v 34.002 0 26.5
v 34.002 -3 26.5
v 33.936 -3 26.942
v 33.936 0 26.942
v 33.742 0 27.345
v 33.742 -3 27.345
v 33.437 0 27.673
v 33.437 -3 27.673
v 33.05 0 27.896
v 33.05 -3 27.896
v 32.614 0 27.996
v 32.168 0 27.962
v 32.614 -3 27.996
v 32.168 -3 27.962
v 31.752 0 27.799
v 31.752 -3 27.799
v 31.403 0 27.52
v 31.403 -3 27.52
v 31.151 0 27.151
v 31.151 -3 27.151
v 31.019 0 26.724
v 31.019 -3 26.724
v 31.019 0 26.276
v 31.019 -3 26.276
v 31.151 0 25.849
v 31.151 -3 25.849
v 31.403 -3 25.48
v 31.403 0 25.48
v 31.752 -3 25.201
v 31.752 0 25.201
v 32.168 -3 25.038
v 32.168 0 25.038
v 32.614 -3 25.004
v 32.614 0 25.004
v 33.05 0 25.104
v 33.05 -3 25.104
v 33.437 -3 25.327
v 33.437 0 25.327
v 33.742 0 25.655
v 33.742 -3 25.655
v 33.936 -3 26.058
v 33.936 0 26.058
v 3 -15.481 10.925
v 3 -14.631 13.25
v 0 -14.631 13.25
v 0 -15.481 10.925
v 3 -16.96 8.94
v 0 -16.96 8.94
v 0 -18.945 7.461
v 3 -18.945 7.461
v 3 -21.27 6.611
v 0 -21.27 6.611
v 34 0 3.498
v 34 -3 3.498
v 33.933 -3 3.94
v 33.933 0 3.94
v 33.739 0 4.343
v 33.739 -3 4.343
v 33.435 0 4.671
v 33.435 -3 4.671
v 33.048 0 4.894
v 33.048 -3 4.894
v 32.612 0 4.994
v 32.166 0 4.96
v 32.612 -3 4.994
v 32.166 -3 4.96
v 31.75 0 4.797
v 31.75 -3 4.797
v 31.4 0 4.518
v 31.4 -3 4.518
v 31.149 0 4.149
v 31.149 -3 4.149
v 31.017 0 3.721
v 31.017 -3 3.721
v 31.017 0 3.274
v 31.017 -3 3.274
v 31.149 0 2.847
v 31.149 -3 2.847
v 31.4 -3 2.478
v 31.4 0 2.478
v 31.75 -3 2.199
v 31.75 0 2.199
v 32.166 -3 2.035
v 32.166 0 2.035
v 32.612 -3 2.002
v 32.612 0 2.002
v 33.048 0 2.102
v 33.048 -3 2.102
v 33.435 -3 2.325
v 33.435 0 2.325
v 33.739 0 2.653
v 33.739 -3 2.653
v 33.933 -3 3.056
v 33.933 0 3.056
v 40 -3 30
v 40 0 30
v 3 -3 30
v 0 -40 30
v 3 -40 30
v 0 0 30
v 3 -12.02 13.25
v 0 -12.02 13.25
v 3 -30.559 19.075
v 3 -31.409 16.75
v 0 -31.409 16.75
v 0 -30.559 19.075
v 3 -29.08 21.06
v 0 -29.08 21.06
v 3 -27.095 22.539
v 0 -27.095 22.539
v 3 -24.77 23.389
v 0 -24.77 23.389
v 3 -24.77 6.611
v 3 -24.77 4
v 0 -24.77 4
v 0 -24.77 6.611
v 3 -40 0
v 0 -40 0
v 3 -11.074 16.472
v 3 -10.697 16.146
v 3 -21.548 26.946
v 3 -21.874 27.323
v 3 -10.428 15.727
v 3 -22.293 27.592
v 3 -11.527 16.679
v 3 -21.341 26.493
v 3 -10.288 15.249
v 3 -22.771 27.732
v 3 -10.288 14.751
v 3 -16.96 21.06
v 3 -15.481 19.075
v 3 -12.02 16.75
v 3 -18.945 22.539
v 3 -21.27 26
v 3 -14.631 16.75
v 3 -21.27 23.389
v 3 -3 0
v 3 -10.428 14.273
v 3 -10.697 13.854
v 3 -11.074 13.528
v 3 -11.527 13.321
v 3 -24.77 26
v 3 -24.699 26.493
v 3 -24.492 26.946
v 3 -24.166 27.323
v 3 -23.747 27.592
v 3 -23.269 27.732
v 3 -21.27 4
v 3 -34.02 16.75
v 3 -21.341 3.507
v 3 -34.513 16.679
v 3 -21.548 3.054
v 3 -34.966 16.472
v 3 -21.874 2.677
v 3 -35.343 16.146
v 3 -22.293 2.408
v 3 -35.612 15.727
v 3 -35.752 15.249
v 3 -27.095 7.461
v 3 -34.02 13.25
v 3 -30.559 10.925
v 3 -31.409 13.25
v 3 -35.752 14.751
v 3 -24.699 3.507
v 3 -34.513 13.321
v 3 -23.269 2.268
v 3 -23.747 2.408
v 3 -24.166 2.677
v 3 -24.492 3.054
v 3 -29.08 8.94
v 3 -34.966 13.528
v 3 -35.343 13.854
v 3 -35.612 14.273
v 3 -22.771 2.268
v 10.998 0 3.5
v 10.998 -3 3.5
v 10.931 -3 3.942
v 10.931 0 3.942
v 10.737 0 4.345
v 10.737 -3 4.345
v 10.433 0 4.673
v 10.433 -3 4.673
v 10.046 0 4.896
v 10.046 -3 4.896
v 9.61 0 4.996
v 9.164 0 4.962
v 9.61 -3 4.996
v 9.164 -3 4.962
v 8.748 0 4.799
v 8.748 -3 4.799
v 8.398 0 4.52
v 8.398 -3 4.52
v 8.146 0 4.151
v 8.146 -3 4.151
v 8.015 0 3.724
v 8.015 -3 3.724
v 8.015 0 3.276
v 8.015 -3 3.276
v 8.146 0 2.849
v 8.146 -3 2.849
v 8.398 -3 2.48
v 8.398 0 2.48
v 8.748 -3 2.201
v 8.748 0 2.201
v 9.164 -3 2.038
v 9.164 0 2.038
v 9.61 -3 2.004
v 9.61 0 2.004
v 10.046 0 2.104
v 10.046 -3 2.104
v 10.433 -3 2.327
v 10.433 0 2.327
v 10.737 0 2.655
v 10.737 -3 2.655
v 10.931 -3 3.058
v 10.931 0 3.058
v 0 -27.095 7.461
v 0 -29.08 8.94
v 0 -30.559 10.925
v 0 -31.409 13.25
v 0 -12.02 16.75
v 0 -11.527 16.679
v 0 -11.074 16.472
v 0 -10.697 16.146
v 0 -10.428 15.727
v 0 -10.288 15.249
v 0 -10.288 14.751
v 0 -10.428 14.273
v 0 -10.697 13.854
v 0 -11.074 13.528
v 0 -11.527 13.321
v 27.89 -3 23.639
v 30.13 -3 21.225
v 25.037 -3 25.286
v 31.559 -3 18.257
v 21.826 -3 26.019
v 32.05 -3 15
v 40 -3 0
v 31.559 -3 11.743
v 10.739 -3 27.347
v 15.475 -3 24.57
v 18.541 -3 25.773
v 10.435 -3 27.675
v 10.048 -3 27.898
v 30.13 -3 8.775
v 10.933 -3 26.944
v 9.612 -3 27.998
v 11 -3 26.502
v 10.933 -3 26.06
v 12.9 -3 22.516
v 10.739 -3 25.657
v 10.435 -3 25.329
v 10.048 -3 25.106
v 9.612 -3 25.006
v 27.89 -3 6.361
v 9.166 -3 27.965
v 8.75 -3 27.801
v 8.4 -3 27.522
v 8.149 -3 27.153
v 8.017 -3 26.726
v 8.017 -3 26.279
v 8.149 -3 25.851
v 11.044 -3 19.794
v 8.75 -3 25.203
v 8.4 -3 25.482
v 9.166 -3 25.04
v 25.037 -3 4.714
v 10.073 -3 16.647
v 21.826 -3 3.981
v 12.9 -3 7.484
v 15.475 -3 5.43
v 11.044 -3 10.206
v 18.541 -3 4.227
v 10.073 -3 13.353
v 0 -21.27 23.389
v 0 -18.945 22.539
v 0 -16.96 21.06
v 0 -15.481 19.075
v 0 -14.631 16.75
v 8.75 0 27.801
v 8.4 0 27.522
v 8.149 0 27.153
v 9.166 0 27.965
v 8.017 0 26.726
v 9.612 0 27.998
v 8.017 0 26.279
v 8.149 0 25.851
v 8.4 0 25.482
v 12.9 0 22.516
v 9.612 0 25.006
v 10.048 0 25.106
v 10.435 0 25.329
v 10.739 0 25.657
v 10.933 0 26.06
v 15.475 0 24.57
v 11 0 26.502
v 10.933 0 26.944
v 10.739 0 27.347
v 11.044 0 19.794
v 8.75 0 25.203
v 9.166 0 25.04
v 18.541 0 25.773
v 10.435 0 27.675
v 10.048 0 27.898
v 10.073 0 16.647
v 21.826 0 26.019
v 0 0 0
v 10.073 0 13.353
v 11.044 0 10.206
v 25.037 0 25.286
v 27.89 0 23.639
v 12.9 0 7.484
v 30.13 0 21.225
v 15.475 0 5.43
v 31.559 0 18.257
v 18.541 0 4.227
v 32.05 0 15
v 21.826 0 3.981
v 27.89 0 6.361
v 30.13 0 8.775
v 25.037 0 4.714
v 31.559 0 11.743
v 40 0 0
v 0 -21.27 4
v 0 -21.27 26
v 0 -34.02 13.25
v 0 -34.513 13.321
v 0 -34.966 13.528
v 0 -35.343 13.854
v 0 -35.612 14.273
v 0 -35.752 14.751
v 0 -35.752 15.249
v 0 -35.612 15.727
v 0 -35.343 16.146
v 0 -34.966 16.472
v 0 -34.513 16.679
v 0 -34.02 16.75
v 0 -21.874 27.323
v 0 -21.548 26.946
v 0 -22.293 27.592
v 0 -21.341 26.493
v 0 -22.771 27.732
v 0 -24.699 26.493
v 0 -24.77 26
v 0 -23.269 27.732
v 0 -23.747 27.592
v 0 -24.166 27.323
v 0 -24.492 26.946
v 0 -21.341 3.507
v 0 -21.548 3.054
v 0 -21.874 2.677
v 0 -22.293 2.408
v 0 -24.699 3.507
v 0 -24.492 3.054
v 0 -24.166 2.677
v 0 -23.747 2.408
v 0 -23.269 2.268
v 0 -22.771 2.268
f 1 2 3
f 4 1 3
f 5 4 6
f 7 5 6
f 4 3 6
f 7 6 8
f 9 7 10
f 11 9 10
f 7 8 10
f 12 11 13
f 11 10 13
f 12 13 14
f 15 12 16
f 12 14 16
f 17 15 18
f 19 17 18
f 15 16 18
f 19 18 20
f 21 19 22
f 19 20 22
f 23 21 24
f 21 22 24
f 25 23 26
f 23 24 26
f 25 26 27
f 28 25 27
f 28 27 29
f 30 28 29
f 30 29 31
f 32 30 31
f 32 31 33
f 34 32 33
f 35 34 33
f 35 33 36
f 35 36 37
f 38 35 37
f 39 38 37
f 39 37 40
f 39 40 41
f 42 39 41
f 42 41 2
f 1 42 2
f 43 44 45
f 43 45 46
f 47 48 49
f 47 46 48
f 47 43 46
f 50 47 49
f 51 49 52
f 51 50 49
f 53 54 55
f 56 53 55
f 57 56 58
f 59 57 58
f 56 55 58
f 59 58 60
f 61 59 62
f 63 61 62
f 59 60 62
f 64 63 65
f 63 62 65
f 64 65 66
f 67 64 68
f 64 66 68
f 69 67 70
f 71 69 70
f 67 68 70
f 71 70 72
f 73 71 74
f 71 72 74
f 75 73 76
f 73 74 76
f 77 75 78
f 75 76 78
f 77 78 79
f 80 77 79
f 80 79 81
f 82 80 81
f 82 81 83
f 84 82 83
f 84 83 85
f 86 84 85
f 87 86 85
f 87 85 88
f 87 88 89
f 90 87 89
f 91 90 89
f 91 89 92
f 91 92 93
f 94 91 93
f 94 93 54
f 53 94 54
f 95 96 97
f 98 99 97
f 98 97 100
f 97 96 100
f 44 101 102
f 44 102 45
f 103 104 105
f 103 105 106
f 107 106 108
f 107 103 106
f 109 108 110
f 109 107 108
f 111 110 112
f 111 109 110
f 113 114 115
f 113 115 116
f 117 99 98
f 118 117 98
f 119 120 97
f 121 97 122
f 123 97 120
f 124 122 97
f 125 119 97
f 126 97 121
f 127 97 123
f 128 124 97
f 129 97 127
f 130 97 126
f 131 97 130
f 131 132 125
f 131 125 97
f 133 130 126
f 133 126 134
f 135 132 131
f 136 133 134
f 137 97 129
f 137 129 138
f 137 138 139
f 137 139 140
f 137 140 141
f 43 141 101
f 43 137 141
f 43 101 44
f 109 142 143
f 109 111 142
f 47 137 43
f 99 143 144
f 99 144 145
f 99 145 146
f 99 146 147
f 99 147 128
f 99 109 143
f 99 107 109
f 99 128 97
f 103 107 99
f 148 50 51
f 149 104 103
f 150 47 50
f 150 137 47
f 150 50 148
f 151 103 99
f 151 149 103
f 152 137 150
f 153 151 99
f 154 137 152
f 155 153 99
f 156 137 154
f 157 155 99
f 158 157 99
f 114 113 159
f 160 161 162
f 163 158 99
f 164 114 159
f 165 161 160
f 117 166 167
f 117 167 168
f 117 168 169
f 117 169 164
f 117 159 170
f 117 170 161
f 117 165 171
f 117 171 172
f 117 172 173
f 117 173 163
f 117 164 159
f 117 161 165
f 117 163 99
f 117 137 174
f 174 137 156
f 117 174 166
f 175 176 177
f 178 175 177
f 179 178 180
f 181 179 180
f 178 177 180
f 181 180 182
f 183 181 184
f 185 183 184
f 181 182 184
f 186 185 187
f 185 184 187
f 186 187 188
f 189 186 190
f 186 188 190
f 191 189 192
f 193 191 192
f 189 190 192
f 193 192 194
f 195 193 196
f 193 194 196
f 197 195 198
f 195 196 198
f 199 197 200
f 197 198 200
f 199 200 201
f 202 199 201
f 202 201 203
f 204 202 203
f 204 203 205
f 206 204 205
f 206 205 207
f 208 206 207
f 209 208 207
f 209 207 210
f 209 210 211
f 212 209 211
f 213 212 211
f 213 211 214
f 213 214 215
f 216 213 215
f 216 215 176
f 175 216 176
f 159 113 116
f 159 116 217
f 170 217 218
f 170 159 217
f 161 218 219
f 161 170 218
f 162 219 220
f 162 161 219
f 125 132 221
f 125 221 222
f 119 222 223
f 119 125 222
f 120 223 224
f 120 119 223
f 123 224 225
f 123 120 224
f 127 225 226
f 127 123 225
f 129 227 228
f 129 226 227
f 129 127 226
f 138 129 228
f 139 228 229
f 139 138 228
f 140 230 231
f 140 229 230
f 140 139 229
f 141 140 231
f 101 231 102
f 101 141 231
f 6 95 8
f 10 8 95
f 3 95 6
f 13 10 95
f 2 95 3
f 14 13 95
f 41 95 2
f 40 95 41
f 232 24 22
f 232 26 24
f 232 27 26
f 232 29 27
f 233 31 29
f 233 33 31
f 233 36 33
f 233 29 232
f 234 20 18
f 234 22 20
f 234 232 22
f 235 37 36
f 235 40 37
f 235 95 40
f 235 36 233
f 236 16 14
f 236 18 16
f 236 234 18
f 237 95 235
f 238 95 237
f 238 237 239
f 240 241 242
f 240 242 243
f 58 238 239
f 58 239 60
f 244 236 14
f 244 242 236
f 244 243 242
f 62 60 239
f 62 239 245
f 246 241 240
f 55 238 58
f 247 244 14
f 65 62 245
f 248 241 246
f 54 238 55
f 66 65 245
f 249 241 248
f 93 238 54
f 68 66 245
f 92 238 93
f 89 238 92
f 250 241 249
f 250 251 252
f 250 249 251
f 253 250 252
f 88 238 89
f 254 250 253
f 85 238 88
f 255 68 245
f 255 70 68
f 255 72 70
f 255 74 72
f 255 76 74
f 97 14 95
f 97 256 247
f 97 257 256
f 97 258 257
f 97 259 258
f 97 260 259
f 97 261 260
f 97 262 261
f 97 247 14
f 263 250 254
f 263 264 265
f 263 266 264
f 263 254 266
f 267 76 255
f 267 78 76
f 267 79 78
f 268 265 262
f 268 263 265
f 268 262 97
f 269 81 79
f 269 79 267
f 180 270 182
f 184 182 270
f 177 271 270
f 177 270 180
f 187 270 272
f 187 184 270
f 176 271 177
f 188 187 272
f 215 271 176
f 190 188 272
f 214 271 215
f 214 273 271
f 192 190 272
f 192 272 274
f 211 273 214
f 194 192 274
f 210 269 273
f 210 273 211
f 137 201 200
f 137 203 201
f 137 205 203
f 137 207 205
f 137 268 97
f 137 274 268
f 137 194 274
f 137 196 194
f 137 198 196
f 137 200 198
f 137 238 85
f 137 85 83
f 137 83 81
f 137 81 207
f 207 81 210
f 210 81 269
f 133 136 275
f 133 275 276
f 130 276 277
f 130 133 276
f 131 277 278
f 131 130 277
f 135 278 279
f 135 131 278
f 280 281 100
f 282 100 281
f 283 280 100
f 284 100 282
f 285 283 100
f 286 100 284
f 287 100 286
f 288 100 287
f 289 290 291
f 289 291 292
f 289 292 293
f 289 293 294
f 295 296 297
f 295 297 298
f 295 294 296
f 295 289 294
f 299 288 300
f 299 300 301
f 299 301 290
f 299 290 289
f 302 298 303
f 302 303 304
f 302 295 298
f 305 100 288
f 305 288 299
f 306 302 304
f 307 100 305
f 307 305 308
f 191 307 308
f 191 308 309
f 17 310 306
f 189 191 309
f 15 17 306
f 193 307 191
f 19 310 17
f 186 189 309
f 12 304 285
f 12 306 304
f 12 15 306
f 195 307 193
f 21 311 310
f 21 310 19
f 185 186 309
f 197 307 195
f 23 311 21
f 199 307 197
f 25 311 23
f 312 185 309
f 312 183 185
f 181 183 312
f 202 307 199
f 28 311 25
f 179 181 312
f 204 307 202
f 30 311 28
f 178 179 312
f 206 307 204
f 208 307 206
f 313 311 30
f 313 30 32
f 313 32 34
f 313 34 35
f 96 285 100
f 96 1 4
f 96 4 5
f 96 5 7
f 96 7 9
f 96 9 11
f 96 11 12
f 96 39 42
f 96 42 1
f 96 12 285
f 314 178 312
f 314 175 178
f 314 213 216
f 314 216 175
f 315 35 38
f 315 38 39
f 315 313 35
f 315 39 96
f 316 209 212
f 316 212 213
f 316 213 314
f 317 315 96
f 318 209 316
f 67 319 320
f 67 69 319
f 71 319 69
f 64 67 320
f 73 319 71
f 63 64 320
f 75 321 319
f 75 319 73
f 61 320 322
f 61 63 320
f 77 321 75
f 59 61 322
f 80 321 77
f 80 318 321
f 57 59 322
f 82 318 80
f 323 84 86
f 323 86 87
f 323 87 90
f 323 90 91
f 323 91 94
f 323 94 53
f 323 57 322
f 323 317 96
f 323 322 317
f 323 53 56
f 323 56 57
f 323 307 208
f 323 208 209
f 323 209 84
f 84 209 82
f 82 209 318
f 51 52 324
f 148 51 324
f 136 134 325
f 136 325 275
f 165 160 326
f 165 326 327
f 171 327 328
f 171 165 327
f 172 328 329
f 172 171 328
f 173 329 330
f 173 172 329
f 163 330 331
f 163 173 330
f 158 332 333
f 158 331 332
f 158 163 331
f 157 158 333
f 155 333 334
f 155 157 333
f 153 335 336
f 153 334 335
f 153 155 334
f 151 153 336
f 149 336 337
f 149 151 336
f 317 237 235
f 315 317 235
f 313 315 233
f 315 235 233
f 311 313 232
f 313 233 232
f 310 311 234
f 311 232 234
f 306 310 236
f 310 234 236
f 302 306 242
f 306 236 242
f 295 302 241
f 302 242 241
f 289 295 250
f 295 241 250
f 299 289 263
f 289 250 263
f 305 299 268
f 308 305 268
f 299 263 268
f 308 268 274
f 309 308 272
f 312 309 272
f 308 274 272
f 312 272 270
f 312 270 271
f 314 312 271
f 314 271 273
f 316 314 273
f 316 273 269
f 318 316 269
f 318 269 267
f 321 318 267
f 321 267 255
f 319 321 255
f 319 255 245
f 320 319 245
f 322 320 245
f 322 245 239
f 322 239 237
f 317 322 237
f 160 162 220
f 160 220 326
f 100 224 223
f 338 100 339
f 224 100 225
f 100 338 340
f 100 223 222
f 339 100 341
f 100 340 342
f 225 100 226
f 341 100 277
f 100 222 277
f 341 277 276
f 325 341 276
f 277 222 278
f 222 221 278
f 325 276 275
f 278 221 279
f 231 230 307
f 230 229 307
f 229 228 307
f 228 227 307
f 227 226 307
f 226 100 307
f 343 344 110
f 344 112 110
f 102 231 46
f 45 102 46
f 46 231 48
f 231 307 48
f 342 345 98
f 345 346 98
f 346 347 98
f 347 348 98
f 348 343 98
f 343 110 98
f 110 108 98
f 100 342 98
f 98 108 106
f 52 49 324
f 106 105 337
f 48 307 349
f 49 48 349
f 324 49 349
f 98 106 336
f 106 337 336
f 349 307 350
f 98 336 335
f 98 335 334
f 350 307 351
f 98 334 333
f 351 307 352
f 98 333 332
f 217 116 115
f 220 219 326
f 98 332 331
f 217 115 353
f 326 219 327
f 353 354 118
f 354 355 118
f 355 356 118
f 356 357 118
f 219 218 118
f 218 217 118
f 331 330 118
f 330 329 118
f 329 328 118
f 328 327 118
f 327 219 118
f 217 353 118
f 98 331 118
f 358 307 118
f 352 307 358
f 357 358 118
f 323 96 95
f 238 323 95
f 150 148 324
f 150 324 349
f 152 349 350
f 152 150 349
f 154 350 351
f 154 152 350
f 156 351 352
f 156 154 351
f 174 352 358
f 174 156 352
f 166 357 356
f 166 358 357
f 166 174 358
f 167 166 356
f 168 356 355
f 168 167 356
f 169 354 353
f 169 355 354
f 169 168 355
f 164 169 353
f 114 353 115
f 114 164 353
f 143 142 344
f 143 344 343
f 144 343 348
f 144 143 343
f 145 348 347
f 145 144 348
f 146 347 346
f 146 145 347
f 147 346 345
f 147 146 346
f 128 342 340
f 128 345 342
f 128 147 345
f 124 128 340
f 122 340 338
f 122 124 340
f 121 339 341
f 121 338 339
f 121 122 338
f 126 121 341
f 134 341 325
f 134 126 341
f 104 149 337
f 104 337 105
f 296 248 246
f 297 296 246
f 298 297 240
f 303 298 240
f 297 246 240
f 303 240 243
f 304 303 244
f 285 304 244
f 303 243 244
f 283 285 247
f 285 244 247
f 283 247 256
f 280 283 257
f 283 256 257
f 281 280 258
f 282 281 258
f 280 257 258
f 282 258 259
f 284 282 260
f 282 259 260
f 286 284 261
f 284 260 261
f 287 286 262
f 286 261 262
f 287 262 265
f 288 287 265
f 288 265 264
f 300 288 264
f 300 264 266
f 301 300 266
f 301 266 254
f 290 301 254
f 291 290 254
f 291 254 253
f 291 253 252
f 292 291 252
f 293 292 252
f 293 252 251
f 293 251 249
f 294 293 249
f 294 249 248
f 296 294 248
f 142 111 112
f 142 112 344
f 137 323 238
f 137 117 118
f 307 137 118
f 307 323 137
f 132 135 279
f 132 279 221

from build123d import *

# Parameters (mm, degrees)
BOSS_EXTRUDE1_DEPTH = 30
SKETCH2_R           = 11.05
SKETCH2_R_2         = 1.5
CUT_EXTRUDE1_DEPTH  = 4
CUT_EXTRUDE2_DEPTH  = 4


with BuildPart() as part:
    # Sketch1 → Boss-Extrude1 (new body)
    with BuildSketch(Plane.XY):
        Polygon((0, 0), (40, 0), (40, -3), (3, -3), (3, -40), (0, -40), (0, -3), align=None)
    extrude(amount=BOSS_EXTRUDE1_DEPTH)

    # Sketch2 → Cut-Extrude1 (cut, through all)
    with BuildSketch(Plane.XZ.offset(3)):
        with Locations((21, 15)):
            Circle(SKETCH2_R)
        with Locations((32.502183488, 26.5)):
            Circle(SKETCH2_R_2)
        with Locations((32.5, 3.497816512)):
            Circle(SKETCH2_R_2)
        with Locations((9.497816512, 3.5)):
            Circle(SKETCH2_R_2)
        with Locations((9.5, 26.502183488)):
            Circle(SKETCH2_R_2)
    extrude(amount=-CUT_EXTRUDE1_DEPTH, mode=Mode.SUBTRACT)

    # Sketch3 → Cut-Extrude2 (cut, through all)
    with BuildSketch(Plane(origin=(3, 0, 0), x_dir=(0, 0, -1), z_dir=(1, 0, 0))):
        with BuildLine():
            Line((-26, -21.27), (-23.389421911, -21.27))
            ThreePointArc((-23.389421911, -21.27), (-21.059905115, -16.960094885), (-16.75, -14.630578089))
            Line((-16.75, -14.630578089), (-16.75, -12.02))
            ThreePointArc((-16.75, -12.02), (-15, -10.27), (-13.25, -12.02))
            Line((-13.25, -12.02), (-13.25, -14.630578089))
            ThreePointArc((-13.25, -14.630578089), (-8.940094885, -16.960094885), (-6.610578089, -21.27))
            Line((-6.610578089, -21.27), (-4, -21.27))
            ThreePointArc((-4, -21.27), (-2.25, -23.02), (-4, -24.77))
            Line((-4, -24.77), (-6.610578089, -24.77))
            ThreePointArc((-6.610578089, -24.77), (-8.940094885, -29.079905115), (-13.25, -31.409421911))
            Line((-13.25, -31.409421911), (-13.25, -34.02))
            ThreePointArc((-13.25, -34.02), (-15, -35.77), (-16.75, -34.02))
            Line((-16.75, -34.02), (-16.75, -31.409421911))
            ThreePointArc((-16.75, -31.409421911), (-21.059905115, -29.079905115), (-23.389421911, -24.77))
            Line((-23.389421911, -24.77), (-26, -24.77))
            ThreePointArc((-26, -24.77), (-27.75, -23.02), (-26, -21.27))
        make_face()
    extrude(amount=-CUT_EXTRUDE2_DEPTH, mode=Mode.SUBTRACT)


solid = part.part
